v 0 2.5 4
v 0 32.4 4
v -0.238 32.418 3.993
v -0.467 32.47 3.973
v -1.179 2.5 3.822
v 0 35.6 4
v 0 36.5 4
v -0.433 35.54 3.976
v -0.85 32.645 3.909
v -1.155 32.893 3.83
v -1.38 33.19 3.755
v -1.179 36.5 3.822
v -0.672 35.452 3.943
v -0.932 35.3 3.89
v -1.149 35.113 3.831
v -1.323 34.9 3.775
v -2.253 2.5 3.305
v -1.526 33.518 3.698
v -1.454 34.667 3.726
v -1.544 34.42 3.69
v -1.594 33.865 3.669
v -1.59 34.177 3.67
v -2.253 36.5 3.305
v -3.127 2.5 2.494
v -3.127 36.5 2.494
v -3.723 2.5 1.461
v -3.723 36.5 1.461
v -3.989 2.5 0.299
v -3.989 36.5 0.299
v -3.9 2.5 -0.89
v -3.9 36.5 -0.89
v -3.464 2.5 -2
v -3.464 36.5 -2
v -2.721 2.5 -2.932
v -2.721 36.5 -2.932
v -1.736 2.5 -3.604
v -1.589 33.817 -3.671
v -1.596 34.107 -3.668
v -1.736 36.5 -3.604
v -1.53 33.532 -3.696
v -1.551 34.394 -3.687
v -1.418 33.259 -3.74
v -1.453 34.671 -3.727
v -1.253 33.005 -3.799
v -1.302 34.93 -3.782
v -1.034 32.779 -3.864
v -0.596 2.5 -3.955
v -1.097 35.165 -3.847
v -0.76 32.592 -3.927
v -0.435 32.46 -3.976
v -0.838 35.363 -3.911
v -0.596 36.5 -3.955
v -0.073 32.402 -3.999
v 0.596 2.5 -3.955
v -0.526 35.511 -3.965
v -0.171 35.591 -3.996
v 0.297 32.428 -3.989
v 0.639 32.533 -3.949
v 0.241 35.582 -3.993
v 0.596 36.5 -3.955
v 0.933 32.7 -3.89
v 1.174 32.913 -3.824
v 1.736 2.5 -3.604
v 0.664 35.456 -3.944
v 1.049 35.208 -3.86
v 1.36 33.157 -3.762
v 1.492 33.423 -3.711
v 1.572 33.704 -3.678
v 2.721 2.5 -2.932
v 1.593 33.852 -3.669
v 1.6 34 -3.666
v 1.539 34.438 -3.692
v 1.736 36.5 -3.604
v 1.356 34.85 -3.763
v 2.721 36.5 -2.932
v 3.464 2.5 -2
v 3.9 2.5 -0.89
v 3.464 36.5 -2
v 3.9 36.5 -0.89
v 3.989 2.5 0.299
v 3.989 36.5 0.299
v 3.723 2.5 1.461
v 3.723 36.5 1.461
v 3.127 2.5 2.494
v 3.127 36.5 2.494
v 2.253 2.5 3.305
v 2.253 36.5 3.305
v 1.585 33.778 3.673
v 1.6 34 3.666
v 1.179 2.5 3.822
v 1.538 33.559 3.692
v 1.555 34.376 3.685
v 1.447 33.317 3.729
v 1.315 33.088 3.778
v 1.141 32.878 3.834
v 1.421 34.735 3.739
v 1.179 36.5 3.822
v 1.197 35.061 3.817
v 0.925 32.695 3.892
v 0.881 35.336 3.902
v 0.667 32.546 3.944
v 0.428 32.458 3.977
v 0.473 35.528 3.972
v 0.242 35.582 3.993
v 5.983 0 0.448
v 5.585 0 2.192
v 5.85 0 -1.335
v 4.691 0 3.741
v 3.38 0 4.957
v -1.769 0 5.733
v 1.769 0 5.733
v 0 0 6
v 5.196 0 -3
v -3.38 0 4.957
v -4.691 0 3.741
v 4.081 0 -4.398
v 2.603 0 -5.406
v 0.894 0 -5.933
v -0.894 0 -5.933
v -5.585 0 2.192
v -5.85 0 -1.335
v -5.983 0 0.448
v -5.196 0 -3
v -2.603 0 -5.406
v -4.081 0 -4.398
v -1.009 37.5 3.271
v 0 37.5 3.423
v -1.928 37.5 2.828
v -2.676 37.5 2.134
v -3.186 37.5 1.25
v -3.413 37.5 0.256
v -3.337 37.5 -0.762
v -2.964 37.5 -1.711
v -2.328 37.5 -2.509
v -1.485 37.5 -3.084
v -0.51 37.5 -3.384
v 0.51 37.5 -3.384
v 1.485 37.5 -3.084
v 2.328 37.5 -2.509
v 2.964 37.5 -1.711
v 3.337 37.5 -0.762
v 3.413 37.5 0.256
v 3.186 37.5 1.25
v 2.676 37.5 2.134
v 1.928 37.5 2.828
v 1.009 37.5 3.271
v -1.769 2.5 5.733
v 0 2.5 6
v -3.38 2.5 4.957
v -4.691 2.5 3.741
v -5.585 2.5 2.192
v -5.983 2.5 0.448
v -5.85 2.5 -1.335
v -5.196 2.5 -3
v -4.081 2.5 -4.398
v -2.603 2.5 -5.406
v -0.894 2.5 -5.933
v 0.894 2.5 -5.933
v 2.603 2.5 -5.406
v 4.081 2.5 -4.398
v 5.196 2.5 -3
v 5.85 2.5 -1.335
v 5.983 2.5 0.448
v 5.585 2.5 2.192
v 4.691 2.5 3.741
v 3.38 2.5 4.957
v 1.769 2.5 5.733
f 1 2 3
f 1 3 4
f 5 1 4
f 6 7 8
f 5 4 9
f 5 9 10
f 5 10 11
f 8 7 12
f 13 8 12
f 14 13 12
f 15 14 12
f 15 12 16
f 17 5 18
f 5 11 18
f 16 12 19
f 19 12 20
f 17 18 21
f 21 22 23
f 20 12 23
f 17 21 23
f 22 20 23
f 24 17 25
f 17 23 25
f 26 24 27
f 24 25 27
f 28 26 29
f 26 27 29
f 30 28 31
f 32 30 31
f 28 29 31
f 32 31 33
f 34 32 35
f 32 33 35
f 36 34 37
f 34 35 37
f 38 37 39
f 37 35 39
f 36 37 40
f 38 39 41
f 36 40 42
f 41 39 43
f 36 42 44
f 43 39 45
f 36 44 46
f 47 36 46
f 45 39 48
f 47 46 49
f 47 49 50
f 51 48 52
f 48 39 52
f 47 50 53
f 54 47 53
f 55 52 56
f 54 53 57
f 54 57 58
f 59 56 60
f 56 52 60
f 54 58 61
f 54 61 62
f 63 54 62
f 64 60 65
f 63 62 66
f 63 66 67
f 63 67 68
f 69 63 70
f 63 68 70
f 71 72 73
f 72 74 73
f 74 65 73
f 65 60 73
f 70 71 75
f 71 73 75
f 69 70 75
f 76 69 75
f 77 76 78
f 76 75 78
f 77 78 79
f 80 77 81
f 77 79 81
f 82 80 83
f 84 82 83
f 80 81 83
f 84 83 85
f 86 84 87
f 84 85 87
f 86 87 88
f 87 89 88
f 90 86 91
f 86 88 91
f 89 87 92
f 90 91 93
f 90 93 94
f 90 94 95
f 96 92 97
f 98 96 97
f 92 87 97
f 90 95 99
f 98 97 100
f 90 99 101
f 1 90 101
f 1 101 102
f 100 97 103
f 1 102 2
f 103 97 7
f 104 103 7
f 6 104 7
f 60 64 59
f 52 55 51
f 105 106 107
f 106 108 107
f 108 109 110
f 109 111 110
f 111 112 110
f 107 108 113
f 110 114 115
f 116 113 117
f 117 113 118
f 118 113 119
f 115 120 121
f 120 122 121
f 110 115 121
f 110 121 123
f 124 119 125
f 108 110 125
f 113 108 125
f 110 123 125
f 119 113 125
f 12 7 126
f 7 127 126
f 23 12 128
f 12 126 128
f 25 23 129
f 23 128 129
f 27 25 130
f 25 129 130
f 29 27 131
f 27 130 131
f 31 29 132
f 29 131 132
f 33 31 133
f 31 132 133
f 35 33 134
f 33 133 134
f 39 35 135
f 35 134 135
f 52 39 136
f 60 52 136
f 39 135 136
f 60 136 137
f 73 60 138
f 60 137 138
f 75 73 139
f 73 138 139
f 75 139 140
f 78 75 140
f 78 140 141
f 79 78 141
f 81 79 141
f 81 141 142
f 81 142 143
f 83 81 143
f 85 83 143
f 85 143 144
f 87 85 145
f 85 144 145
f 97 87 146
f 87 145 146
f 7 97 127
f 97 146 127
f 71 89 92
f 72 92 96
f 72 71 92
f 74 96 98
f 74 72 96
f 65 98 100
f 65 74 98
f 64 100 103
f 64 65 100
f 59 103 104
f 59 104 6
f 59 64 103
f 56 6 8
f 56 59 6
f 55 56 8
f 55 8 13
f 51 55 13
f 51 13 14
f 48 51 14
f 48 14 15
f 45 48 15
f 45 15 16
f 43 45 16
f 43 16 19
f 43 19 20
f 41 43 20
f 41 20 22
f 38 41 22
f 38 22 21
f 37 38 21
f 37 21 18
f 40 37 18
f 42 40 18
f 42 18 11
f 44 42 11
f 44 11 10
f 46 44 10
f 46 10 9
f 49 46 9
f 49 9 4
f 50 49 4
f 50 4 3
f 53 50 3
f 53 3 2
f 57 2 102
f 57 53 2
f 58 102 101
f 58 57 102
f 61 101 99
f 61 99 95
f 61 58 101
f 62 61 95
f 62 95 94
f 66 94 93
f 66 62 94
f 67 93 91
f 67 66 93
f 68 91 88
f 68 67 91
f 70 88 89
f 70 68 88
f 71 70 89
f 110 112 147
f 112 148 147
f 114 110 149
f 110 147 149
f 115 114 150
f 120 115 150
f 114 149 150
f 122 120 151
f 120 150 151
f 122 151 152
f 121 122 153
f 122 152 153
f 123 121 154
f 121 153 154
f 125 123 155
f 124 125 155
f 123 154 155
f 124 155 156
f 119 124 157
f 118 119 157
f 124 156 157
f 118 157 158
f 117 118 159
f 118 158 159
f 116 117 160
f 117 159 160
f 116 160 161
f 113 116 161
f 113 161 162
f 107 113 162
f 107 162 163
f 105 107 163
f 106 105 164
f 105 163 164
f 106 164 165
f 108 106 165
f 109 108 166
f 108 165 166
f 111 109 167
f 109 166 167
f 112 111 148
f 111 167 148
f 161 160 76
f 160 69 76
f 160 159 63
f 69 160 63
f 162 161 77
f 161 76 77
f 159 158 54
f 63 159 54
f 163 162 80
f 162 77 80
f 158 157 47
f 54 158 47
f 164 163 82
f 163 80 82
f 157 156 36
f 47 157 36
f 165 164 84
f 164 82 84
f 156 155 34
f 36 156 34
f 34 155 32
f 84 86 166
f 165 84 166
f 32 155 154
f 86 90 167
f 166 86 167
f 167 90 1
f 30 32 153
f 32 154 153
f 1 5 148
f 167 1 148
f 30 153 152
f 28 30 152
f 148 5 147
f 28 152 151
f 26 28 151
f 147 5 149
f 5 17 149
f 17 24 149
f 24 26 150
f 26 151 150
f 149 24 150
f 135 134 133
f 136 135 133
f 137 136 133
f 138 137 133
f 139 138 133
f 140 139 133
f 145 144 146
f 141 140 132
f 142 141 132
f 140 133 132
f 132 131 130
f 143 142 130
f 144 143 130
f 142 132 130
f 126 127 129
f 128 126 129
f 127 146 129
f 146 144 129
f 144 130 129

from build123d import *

# Parameters (mm, degrees)
CUT_EXTRUDE_1_DEPTH      = 39.448016854
CUT_EXTRUDE_1_DEPTH_BACK = 39.448016854
SKETCH_2_R               = 1.6


with BuildPart() as part:
    # 草图1 → 旋转1 (revolve)
    with BuildSketch(Plane.XY, mode=Mode.PRIVATE) as revolve_1_sk:
        Polygon((0, 0), (6, 0), (6, 2.5), (4, 2.5), (4, 36.5), (3.422649731, 37.5), (0, 37.5), align=None)
    revolve(revolve_1_sk.sketch.rotate(Axis((0, 0, 0), (0, -1, 0)), 90), axis=Axis((0, 0, 0), (0, -1, 0)))

    # 草图2 → 切除-拉伸1 (cut, two sides: drawn at the far end of the back side and taken through both)
    with BuildSketch(Plane.XY.offset(-CUT_EXTRUDE_1_DEPTH_BACK)):
        with Locations((0, 34)):
            Circle(SKETCH_2_R)
    extrude(amount=CUT_EXTRUDE_1_DEPTH + CUT_EXTRUDE_1_DEPTH_BACK, mode=Mode.SUBTRACT)


solid = part.part
